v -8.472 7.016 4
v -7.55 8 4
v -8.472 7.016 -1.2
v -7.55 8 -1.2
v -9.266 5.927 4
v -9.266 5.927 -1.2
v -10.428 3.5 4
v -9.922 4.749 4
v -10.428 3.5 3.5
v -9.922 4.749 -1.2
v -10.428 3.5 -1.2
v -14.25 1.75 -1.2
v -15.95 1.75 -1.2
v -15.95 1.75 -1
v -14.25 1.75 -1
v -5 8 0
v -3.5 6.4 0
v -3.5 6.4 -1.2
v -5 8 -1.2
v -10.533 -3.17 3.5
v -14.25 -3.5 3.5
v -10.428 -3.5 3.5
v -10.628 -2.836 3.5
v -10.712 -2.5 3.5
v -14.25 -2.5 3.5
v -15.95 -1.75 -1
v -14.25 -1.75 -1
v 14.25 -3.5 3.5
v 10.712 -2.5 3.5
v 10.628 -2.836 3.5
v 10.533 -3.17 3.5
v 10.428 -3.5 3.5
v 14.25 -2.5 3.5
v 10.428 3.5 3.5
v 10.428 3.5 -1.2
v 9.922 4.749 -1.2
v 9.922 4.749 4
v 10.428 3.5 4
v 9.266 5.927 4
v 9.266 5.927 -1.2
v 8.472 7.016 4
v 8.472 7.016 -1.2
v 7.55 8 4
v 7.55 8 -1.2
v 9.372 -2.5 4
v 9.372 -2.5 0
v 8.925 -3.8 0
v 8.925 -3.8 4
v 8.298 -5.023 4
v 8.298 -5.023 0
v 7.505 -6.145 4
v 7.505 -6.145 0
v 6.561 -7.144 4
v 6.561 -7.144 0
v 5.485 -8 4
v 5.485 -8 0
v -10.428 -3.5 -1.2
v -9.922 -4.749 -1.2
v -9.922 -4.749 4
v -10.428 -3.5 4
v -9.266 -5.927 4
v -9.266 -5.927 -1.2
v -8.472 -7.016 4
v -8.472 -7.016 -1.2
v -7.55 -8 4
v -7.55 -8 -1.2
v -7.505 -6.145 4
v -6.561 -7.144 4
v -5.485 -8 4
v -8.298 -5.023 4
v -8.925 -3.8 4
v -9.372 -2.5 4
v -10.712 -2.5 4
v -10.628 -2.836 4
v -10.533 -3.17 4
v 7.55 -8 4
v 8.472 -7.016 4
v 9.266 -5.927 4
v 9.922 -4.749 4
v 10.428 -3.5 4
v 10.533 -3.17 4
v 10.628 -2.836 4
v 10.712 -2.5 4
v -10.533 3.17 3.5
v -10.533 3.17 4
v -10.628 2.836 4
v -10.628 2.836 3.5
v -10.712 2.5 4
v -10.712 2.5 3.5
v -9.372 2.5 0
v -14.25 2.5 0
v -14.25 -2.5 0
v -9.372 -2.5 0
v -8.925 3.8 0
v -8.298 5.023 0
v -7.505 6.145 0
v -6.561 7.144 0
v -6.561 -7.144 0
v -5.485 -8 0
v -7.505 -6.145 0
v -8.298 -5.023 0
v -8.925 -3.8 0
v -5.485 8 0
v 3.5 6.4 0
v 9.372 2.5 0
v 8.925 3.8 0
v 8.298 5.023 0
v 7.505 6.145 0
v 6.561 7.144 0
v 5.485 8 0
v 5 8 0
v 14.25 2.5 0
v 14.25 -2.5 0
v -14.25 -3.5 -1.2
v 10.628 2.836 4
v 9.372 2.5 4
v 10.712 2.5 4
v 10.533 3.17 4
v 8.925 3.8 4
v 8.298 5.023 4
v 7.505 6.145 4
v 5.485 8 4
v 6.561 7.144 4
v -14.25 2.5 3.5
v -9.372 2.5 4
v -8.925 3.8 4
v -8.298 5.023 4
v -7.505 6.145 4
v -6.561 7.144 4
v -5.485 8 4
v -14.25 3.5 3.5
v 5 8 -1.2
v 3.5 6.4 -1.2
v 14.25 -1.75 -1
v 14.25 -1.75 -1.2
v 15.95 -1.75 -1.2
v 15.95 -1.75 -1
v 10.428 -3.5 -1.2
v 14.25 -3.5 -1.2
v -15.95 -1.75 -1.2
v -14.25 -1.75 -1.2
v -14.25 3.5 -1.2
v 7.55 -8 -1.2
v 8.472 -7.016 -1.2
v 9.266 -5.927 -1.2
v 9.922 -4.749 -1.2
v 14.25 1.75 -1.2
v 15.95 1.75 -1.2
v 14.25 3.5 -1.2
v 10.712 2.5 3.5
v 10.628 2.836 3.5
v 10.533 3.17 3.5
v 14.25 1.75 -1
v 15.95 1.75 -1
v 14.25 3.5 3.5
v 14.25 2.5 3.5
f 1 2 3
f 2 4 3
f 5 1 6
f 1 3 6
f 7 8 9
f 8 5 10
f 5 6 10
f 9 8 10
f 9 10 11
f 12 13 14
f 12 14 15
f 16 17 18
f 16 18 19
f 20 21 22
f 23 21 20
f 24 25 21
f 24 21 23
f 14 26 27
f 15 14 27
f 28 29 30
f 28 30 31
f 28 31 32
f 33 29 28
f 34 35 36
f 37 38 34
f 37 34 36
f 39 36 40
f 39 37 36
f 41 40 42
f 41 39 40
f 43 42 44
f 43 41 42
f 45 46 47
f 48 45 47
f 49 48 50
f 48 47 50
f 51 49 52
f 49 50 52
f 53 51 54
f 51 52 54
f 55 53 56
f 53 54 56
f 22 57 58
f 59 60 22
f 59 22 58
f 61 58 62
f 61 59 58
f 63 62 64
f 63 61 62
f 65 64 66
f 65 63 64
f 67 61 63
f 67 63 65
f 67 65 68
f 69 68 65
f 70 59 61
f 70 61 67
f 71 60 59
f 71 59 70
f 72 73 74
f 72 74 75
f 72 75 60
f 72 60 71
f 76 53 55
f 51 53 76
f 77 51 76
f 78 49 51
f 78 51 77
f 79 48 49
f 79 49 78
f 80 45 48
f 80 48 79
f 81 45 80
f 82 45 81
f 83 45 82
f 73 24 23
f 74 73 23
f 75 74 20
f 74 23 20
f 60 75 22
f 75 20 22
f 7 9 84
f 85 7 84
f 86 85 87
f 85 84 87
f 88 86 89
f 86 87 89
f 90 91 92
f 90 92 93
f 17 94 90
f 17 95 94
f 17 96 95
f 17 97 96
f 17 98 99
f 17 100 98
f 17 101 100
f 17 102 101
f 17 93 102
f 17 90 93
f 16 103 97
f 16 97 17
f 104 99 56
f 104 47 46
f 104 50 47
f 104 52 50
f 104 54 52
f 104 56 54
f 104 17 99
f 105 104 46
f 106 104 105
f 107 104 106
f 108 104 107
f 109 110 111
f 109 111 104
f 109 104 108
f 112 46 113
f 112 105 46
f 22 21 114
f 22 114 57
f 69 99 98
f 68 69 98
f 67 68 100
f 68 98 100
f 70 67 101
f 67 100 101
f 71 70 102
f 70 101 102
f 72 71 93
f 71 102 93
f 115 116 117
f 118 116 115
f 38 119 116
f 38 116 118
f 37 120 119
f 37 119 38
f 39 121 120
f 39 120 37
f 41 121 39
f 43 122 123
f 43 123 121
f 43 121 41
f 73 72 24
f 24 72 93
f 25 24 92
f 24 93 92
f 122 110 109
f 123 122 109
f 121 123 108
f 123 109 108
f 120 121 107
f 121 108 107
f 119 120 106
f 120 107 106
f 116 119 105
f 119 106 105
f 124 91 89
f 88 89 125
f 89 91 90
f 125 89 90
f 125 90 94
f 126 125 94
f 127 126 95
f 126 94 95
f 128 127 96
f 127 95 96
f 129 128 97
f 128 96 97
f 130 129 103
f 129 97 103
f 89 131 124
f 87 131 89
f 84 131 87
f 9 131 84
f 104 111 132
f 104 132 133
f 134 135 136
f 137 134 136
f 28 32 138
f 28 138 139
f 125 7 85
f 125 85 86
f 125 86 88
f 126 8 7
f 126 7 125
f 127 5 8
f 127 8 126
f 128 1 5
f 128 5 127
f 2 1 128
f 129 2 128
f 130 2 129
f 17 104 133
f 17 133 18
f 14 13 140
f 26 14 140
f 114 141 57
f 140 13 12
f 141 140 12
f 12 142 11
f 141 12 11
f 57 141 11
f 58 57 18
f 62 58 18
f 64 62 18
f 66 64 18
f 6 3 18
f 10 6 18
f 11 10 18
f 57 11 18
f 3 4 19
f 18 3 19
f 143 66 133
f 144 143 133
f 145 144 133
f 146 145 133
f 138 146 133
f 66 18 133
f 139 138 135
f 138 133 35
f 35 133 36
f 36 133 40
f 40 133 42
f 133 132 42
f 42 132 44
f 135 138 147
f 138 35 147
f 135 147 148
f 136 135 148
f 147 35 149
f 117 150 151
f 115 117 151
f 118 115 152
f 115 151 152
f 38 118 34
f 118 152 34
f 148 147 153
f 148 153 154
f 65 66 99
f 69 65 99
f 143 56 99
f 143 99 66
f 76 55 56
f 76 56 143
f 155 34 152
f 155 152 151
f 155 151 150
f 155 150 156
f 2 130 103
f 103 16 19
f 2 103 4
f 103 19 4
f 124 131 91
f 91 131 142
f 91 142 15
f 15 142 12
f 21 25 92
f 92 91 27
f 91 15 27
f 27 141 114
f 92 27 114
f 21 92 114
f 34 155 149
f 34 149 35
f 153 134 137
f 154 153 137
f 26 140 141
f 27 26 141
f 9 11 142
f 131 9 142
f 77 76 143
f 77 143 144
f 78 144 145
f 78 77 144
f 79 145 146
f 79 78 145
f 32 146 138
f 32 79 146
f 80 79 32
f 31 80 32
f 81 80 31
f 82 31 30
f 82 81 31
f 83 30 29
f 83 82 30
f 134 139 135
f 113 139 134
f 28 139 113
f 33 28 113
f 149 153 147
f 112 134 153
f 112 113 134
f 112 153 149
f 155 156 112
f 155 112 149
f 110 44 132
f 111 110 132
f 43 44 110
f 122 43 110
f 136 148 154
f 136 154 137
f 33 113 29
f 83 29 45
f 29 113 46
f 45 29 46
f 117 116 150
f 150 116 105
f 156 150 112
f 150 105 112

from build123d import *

# Parameters (mm, degrees)
F1_DEPTH = 1.2
F2_DEPTH = 4
F3_DEPTH = 3.5
F4_W     = 1.7
F4_H     = 3.5
F5_DEPTH = 0.2


# Not quite as in the source:
# - a feature names something its author has since deleted; it is built from what else it names


with BuildPart() as f1:
    # F0 (on Top) → F1 (new body)
    with BuildSketch(Plane.XY):
        with BuildLine():
            ThreePointArc((-10.7121426428, 2.5), (-10.5820537772, 3.0033544341), (-10.4283268073, 3.5))
            Line((-10.4283268073, 3.5), (-14.25, 3.5))
            Line((-14.25, 3.5), (-14.25, 2.5))
            Line((-14.25, 2.5), (-10.7121426428, 2.5))
        make_face()
        with BuildLine():
            ThreePointArc((-10.4283268073, -3.5), (-10.5820537772, -3.0033544341), (-10.7121426428, -2.5))
            Line((-10.7121426428, -2.5), (-14.25, -2.5))
            Line((-14.25, -2.5), (-14.25, -3.5))
            Line((-14.25, -3.5), (-10.4283268073, -3.5))
        make_face()
        with BuildLine():
            Line((-9.3722996111, -2.5), (-10.7121426428, -2.5))
            ThreePointArc((-10.7121426428, -2.5), (-10.5820537772, -3.0033544341), (-10.4283268073, -3.5))
            Line((-10.4283268073, -3.5), (-9.0465463023, -3.5))
            ThreePointArc((-9.0465463023, -3.5), (-9.2229860238, -3.004418214), (-9.3722996111, -2.5))
        make_face()
        with BuildLine():
            Line((-9.0465463023, 3.5), (-10.4283268073, 3.5))
            ThreePointArc((-10.4283268073, 3.5), (-10.5820537772, 3.0033544341), (-10.7121426428, 2.5))
            Line((-10.7121426428, 2.5), (-9.3722996111, 2.5))
            ThreePointArc((-9.3722996111, 2.5), (-9.2229860238, 3.004418214), (-9.0465463023, 3.5))
        make_face()
        with BuildLine():
            Line((-9.3722996111, 2.5), (-10.7121426428, 2.5))
            ThreePointArc((-10.7121426428, 2.5), (-11, 0), (-10.7121426428, -2.5))
            Line((-10.7121426428, -2.5), (-9.3722996111, -2.5))
            ThreePointArc((-9.3722996111, -2.5), (-9.7, 0), (-9.3722996111, 2.5))
        make_face()
        with BuildLine():
            ThreePointArc((9.0465463023, 3.5), (7.606386924, 6.0193752136), (5.4854352608, 8))
            Line((5.4854352608, 8), (5, 8))
            Line((5, 8), (3.5, 6.4))
            Line((3.5, 6.4), (-3.5, 6.4))
            Line((-3.5, 6.4), (-5, 8))
            Line((-5, 8), (-5.4854352608, 8))
            ThreePointArc((-5.4854352608, 8), (-7.606386924, 6.0193752136), (-9.0465463023, 3.5))
            Line((-9.0465463023, 3.5), (9.0465463023, 3.5))
        make_face()
        with BuildLine():
            ThreePointArc((9.3722996111, 2.5), (9.2229860238, 3.004418214), (9.0465463023, 3.5))
            Line((9.0465463023, 3.5), (-9.0465463023, 3.5))
            ThreePointArc((-9.0465463023, 3.5), (-9.2229860238, 3.004418214), (-9.3722996111, 2.5))
            ThreePointArc((-9.3722996111, 2.5), (-9.7, 0), (-9.3722996111, -2.5))
            ThreePointArc((-9.3722996111, -2.5), (-9.2229860238, -3.004418214), (-9.0465463023, -3.5))
            Line((-9.0465463023, -3.5), (9.0465463023, -3.5))
            ThreePointArc((9.0465463023, -3.5), (9.2229860238, -3.004418214), (9.3722996111, -2.5))
            ThreePointArc((9.3722996111, -2.5), (9.6177259845, -1.2606930182), (9.7, 0))
            ThreePointArc((9.7, 0), (9.6177259845, 1.2606930182), (9.3722996111, 2.5))
        make_face()
        with BuildLine():
            Line((-5.4854352608, 8), (-7.5498344353, 8))
            ThreePointArc((-7.5498344353, 8), (-9.2663946827, 5.9273880912), (-10.4283268073, 3.5))
            Line((-10.4283268073, 3.5), (-9.0465463023, 3.5))
            ThreePointArc((-9.0465463023, 3.5), (-7.606386924, 6.0193752136), (-5.4854352608, 8))
        make_face()
        with BuildLine():
            ThreePointArc((10.4283268073, 3.5), (9.2663946827, 5.9273880912), (7.5498344353, 8))
            Line((7.5498344353, 8), (5.4854352608, 8))
            ThreePointArc((5.4854352608, 8), (7.606386924, 6.0193752136), (9.0465463023, 3.5))
            Line((9.0465463023, 3.5), (10.4283268073, 3.5))
        make_face()
        with BuildLine():
            Line((14.25, 3.5), (10.4283268073, 3.5))
            ThreePointArc((10.4283268073, 3.5), (10.5820537772, 3.0033544341), (10.7121426428, 2.5))
            Line((10.7121426428, 2.5), (14.25, 2.5))
            Line((14.25, 2.5), (14.25, 3.5))
        make_face()
        with BuildLine():
            Line((14.25, -2.5), (10.7121426428, -2.5))
            ThreePointArc((10.7121426428, -2.5), (10.5820537772, -3.0033544341), (10.4283268073, -3.5))
            Line((10.4283268073, -3.5), (14.25, -3.5))
            Line((14.25, -3.5), (14.25, -2.5))
        make_face()
        with BuildLine():
            ThreePointArc((10.4283268073, -3.5), (10.5820537772, -3.0033544341), (10.7121426428, -2.5))
            Line((10.7121426428, -2.5), (9.3722996111, -2.5))
            ThreePointArc((9.3722996111, -2.5), (9.2229860238, -3.004418214), (9.0465463023, -3.5))
            Line((9.0465463023, -3.5), (10.4283268073, -3.5))
        make_face()
        with BuildLine():
            ThreePointArc((11, 0), (10.9277987049, 1.258258902), (10.7121426428, 2.5))
            Line((10.7121426428, 2.5), (9.3722996111, 2.5))
            ThreePointArc((9.3722996111, 2.5), (9.6177259845, 1.2606930182), (9.7, 0))
            ThreePointArc((9.7, 0), (9.6177259845, -1.2606930182), (9.3722996111, -2.5))
            Line((9.3722996111, -2.5), (10.7121426428, -2.5))
            ThreePointArc((10.7121426428, -2.5), (10.9277987049, -1.258258902), (11, 0))
        make_face()
        with BuildLine():
            ThreePointArc((10.7121426428, 2.5), (10.5820537772, 3.0033544341), (10.4283268073, 3.5))
            Line((10.4283268073, 3.5), (9.0465463023, 3.5))
            ThreePointArc((9.0465463023, 3.5), (9.2229860238, 3.004418214), (9.3722996111, 2.5))
            Line((9.3722996111, 2.5), (10.7121426428, 2.5))
        make_face()
        with BuildLine():
            ThreePointArc((7.5498344353, -8), (9.2663946827, -5.9273880912), (10.4283268073, -3.5))
            Line((10.4283268073, -3.5), (9.0465463023, -3.5))
            ThreePointArc((9.0465463023, -3.5), (7.606386924, -6.0193752136), (5.4854352608, -8))
            Line((5.4854352608, -8), (7.5498344353, -8))
        make_face()
        with BuildLine():
            Line((9.0465463023, -3.5), (-9.0465463023, -3.5))
            ThreePointArc((-9.0465463023, -3.5), (-7.606386924, -6.0193752136), (-5.4854352608, -8))
            Line((-5.4854352608, -8), (5.4854352608, -8))
            ThreePointArc((5.4854352608, -8), (7.606386924, -6.0193752136), (9.0465463023, -3.5))
        make_face()
        with BuildLine():
            Line((-9.0465463023, -3.5), (-10.4283268073, -3.5))
            ThreePointArc((-10.4283268073, -3.5), (-9.2663946827, -5.9273880912), (-7.5498344353, -8))
            Line((-7.5498344353, -8), (-5.4854352608, -8))
            ThreePointArc((-5.4854352608, -8), (-7.606386924, -6.0193752136), (-9.0465463023, -3.5))
        make_face()
        with BuildLine():
            ThreePointArc((-10.7121426428, -2.5), (-11, 0), (-10.7121426428, 2.5))
            Line((-10.7121426428, 2.5), (-14.25, 2.5))
            Line((-14.25, 2.5), (-14.25, -2.5))
            Line((-14.25, -2.5), (-10.7121426428, -2.5))
        make_face()
        with BuildLine():
            Line((14.25, 2.5), (10.7121426428, 2.5))
            ThreePointArc((10.7121426428, 2.5), (10.9277987049, 1.258258902), (11, 0))
            ThreePointArc((11, 0), (10.9277987049, -1.258258902), (10.7121426428, -2.5))
            Line((10.7121426428, -2.5), (14.25, -2.5))
            Line((14.25, -2.5), (14.25, 2.5))
        make_face()
    extrude(amount=-F1_DEPTH)

    # F0 (on Top) → F2 (join)
    with BuildSketch(Plane.XY):
        with BuildLine():
            Line((-5.4854352608, 8), (-7.5498344353, 8))
            ThreePointArc((-7.5498344353, 8), (-9.2663946827, 5.9273880912), (-10.4283268073, 3.5))
            Line((-10.4283268073, 3.5), (-9.0465463023, 3.5))
            ThreePointArc((-9.0465463023, 3.5), (-7.606386924, 6.0193752136), (-5.4854352608, 8))
        make_face()
        with BuildLine():
            Line((-9.0465463023, 3.5), (-10.4283268073, 3.5))
            ThreePointArc((-10.4283268073, 3.5), (-10.5820537772, 3.0033544341), (-10.7121426428, 2.5))
            Line((-10.7121426428, 2.5), (-9.3722996111, 2.5))
            ThreePointArc((-9.3722996111, 2.5), (-9.2229860238, 3.004418214), (-9.0465463023, 3.5))
        make_face()
        with BuildLine():
            Line((-9.3722996111, -2.5), (-10.7121426428, -2.5))
            ThreePointArc((-10.7121426428, -2.5), (-10.5820537772, -3.0033544341), (-10.4283268073, -3.5))
            Line((-10.4283268073, -3.5), (-9.0465463023, -3.5))
            ThreePointArc((-9.0465463023, -3.5), (-9.2229860238, -3.004418214), (-9.3722996111, -2.5))
        make_face()
        with BuildLine():
            Line((-9.0465463023, -3.5), (-10.4283268073, -3.5))
            ThreePointArc((-10.4283268073, -3.5), (-9.2663946827, -5.9273880912), (-7.5498344353, -8))
            Line((-7.5498344353, -8), (-5.4854352608, -8))
            ThreePointArc((-5.4854352608, -8), (-7.606386924, -6.0193752136), (-9.0465463023, -3.5))
        make_face()
        with BuildLine():
            ThreePointArc((7.5498344353, -8), (9.2663946827, -5.9273880912), (10.4283268073, -3.5))
            Line((10.4283268073, -3.5), (9.0465463023, -3.5))
            ThreePointArc((9.0465463023, -3.5), (7.606386924, -6.0193752136), (5.4854352608, -8))
            Line((5.4854352608, -8), (7.5498344353, -8))
        make_face()
        with BuildLine():
            ThreePointArc((10.4283268073, -3.5), (10.5820537772, -3.0033544341), (10.7121426428, -2.5))
            Line((10.7121426428, -2.5), (9.3722996111, -2.5))
            ThreePointArc((9.3722996111, -2.5), (9.2229860238, -3.004418214), (9.0465463023, -3.5))
            Line((9.0465463023, -3.5), (10.4283268073, -3.5))
        make_face()
        with BuildLine():
            ThreePointArc((10.4283268073, 3.5), (9.2663946827, 5.9273880912), (7.5498344353, 8))
            Line((7.5498344353, 8), (5.4854352608, 8))
            ThreePointArc((5.4854352608, 8), (7.606386924, 6.0193752136), (9.0465463023, 3.5))
            Line((9.0465463023, 3.5), (10.4283268073, 3.5))
        make_face()
        with BuildLine():
            ThreePointArc((10.7121426428, 2.5), (10.5820537772, 3.0033544341), (10.4283268073, 3.5))
            Line((10.4283268073, 3.5), (9.0465463023, 3.5))
            ThreePointArc((9.0465463023, 3.5), (9.2229860238, 3.004418214), (9.3722996111, 2.5))
            Line((9.3722996111, 2.5), (10.7121426428, 2.5))
        make_face()
    extrude(amount=F2_DEPTH)

    # F0 (on Top) → F3 (join)
    with BuildSketch(Plane.XY):
        with BuildLine():
            ThreePointArc((-10.7121426428, 2.5), (-10.5820537772, 3.0033544341), (-10.4283268073, 3.5))
            Line((-10.4283268073, 3.5), (-14.25, 3.5))
            Line((-14.25, 3.5), (-14.25, 2.5))
            Line((-14.25, 2.5), (-10.7121426428, 2.5))
        make_face()
        with BuildLine():
            ThreePointArc((-10.4283268073, -3.5), (-10.5820537772, -3.0033544341), (-10.7121426428, -2.5))
            Line((-10.7121426428, -2.5), (-14.25, -2.5))
            Line((-14.25, -2.5), (-14.25, -3.5))
            Line((-14.25, -3.5), (-10.4283268073, -3.5))
        make_face()
        with BuildLine():
            Line((14.25, -2.5), (10.7121426428, -2.5))
            ThreePointArc((10.7121426428, -2.5), (10.5820537772, -3.0033544341), (10.4283268073, -3.5))
            Line((10.4283268073, -3.5), (14.25, -3.5))
            Line((14.25, -3.5), (14.25, -2.5))
        make_face()
        with BuildLine():
            Line((14.25, 3.5), (10.4283268073, 3.5))
            ThreePointArc((10.4283268073, 3.5), (10.5820537772, 3.0033544341), (10.7121426428, 2.5))
            Line((10.7121426428, 2.5), (14.25, 2.5))
            Line((14.25, 2.5), (14.25, 3.5))
        make_face()
    extrude(amount=F3_DEPTH)

    # F4 (on face) → F5 (join)
    with BuildSketch(Plane(origin=(0, 0, -1.2), x_dir=(1, 0, 0), z_dir=(0, 0, -1))):
        with Locations((-15.1, 0)):
            Rectangle(F4_W, F4_H)
        with Locations((15.1, 0)):
            Rectangle(F4_W, F4_H)
    extrude(amount=-F5_DEPTH)


solid = f1.part
